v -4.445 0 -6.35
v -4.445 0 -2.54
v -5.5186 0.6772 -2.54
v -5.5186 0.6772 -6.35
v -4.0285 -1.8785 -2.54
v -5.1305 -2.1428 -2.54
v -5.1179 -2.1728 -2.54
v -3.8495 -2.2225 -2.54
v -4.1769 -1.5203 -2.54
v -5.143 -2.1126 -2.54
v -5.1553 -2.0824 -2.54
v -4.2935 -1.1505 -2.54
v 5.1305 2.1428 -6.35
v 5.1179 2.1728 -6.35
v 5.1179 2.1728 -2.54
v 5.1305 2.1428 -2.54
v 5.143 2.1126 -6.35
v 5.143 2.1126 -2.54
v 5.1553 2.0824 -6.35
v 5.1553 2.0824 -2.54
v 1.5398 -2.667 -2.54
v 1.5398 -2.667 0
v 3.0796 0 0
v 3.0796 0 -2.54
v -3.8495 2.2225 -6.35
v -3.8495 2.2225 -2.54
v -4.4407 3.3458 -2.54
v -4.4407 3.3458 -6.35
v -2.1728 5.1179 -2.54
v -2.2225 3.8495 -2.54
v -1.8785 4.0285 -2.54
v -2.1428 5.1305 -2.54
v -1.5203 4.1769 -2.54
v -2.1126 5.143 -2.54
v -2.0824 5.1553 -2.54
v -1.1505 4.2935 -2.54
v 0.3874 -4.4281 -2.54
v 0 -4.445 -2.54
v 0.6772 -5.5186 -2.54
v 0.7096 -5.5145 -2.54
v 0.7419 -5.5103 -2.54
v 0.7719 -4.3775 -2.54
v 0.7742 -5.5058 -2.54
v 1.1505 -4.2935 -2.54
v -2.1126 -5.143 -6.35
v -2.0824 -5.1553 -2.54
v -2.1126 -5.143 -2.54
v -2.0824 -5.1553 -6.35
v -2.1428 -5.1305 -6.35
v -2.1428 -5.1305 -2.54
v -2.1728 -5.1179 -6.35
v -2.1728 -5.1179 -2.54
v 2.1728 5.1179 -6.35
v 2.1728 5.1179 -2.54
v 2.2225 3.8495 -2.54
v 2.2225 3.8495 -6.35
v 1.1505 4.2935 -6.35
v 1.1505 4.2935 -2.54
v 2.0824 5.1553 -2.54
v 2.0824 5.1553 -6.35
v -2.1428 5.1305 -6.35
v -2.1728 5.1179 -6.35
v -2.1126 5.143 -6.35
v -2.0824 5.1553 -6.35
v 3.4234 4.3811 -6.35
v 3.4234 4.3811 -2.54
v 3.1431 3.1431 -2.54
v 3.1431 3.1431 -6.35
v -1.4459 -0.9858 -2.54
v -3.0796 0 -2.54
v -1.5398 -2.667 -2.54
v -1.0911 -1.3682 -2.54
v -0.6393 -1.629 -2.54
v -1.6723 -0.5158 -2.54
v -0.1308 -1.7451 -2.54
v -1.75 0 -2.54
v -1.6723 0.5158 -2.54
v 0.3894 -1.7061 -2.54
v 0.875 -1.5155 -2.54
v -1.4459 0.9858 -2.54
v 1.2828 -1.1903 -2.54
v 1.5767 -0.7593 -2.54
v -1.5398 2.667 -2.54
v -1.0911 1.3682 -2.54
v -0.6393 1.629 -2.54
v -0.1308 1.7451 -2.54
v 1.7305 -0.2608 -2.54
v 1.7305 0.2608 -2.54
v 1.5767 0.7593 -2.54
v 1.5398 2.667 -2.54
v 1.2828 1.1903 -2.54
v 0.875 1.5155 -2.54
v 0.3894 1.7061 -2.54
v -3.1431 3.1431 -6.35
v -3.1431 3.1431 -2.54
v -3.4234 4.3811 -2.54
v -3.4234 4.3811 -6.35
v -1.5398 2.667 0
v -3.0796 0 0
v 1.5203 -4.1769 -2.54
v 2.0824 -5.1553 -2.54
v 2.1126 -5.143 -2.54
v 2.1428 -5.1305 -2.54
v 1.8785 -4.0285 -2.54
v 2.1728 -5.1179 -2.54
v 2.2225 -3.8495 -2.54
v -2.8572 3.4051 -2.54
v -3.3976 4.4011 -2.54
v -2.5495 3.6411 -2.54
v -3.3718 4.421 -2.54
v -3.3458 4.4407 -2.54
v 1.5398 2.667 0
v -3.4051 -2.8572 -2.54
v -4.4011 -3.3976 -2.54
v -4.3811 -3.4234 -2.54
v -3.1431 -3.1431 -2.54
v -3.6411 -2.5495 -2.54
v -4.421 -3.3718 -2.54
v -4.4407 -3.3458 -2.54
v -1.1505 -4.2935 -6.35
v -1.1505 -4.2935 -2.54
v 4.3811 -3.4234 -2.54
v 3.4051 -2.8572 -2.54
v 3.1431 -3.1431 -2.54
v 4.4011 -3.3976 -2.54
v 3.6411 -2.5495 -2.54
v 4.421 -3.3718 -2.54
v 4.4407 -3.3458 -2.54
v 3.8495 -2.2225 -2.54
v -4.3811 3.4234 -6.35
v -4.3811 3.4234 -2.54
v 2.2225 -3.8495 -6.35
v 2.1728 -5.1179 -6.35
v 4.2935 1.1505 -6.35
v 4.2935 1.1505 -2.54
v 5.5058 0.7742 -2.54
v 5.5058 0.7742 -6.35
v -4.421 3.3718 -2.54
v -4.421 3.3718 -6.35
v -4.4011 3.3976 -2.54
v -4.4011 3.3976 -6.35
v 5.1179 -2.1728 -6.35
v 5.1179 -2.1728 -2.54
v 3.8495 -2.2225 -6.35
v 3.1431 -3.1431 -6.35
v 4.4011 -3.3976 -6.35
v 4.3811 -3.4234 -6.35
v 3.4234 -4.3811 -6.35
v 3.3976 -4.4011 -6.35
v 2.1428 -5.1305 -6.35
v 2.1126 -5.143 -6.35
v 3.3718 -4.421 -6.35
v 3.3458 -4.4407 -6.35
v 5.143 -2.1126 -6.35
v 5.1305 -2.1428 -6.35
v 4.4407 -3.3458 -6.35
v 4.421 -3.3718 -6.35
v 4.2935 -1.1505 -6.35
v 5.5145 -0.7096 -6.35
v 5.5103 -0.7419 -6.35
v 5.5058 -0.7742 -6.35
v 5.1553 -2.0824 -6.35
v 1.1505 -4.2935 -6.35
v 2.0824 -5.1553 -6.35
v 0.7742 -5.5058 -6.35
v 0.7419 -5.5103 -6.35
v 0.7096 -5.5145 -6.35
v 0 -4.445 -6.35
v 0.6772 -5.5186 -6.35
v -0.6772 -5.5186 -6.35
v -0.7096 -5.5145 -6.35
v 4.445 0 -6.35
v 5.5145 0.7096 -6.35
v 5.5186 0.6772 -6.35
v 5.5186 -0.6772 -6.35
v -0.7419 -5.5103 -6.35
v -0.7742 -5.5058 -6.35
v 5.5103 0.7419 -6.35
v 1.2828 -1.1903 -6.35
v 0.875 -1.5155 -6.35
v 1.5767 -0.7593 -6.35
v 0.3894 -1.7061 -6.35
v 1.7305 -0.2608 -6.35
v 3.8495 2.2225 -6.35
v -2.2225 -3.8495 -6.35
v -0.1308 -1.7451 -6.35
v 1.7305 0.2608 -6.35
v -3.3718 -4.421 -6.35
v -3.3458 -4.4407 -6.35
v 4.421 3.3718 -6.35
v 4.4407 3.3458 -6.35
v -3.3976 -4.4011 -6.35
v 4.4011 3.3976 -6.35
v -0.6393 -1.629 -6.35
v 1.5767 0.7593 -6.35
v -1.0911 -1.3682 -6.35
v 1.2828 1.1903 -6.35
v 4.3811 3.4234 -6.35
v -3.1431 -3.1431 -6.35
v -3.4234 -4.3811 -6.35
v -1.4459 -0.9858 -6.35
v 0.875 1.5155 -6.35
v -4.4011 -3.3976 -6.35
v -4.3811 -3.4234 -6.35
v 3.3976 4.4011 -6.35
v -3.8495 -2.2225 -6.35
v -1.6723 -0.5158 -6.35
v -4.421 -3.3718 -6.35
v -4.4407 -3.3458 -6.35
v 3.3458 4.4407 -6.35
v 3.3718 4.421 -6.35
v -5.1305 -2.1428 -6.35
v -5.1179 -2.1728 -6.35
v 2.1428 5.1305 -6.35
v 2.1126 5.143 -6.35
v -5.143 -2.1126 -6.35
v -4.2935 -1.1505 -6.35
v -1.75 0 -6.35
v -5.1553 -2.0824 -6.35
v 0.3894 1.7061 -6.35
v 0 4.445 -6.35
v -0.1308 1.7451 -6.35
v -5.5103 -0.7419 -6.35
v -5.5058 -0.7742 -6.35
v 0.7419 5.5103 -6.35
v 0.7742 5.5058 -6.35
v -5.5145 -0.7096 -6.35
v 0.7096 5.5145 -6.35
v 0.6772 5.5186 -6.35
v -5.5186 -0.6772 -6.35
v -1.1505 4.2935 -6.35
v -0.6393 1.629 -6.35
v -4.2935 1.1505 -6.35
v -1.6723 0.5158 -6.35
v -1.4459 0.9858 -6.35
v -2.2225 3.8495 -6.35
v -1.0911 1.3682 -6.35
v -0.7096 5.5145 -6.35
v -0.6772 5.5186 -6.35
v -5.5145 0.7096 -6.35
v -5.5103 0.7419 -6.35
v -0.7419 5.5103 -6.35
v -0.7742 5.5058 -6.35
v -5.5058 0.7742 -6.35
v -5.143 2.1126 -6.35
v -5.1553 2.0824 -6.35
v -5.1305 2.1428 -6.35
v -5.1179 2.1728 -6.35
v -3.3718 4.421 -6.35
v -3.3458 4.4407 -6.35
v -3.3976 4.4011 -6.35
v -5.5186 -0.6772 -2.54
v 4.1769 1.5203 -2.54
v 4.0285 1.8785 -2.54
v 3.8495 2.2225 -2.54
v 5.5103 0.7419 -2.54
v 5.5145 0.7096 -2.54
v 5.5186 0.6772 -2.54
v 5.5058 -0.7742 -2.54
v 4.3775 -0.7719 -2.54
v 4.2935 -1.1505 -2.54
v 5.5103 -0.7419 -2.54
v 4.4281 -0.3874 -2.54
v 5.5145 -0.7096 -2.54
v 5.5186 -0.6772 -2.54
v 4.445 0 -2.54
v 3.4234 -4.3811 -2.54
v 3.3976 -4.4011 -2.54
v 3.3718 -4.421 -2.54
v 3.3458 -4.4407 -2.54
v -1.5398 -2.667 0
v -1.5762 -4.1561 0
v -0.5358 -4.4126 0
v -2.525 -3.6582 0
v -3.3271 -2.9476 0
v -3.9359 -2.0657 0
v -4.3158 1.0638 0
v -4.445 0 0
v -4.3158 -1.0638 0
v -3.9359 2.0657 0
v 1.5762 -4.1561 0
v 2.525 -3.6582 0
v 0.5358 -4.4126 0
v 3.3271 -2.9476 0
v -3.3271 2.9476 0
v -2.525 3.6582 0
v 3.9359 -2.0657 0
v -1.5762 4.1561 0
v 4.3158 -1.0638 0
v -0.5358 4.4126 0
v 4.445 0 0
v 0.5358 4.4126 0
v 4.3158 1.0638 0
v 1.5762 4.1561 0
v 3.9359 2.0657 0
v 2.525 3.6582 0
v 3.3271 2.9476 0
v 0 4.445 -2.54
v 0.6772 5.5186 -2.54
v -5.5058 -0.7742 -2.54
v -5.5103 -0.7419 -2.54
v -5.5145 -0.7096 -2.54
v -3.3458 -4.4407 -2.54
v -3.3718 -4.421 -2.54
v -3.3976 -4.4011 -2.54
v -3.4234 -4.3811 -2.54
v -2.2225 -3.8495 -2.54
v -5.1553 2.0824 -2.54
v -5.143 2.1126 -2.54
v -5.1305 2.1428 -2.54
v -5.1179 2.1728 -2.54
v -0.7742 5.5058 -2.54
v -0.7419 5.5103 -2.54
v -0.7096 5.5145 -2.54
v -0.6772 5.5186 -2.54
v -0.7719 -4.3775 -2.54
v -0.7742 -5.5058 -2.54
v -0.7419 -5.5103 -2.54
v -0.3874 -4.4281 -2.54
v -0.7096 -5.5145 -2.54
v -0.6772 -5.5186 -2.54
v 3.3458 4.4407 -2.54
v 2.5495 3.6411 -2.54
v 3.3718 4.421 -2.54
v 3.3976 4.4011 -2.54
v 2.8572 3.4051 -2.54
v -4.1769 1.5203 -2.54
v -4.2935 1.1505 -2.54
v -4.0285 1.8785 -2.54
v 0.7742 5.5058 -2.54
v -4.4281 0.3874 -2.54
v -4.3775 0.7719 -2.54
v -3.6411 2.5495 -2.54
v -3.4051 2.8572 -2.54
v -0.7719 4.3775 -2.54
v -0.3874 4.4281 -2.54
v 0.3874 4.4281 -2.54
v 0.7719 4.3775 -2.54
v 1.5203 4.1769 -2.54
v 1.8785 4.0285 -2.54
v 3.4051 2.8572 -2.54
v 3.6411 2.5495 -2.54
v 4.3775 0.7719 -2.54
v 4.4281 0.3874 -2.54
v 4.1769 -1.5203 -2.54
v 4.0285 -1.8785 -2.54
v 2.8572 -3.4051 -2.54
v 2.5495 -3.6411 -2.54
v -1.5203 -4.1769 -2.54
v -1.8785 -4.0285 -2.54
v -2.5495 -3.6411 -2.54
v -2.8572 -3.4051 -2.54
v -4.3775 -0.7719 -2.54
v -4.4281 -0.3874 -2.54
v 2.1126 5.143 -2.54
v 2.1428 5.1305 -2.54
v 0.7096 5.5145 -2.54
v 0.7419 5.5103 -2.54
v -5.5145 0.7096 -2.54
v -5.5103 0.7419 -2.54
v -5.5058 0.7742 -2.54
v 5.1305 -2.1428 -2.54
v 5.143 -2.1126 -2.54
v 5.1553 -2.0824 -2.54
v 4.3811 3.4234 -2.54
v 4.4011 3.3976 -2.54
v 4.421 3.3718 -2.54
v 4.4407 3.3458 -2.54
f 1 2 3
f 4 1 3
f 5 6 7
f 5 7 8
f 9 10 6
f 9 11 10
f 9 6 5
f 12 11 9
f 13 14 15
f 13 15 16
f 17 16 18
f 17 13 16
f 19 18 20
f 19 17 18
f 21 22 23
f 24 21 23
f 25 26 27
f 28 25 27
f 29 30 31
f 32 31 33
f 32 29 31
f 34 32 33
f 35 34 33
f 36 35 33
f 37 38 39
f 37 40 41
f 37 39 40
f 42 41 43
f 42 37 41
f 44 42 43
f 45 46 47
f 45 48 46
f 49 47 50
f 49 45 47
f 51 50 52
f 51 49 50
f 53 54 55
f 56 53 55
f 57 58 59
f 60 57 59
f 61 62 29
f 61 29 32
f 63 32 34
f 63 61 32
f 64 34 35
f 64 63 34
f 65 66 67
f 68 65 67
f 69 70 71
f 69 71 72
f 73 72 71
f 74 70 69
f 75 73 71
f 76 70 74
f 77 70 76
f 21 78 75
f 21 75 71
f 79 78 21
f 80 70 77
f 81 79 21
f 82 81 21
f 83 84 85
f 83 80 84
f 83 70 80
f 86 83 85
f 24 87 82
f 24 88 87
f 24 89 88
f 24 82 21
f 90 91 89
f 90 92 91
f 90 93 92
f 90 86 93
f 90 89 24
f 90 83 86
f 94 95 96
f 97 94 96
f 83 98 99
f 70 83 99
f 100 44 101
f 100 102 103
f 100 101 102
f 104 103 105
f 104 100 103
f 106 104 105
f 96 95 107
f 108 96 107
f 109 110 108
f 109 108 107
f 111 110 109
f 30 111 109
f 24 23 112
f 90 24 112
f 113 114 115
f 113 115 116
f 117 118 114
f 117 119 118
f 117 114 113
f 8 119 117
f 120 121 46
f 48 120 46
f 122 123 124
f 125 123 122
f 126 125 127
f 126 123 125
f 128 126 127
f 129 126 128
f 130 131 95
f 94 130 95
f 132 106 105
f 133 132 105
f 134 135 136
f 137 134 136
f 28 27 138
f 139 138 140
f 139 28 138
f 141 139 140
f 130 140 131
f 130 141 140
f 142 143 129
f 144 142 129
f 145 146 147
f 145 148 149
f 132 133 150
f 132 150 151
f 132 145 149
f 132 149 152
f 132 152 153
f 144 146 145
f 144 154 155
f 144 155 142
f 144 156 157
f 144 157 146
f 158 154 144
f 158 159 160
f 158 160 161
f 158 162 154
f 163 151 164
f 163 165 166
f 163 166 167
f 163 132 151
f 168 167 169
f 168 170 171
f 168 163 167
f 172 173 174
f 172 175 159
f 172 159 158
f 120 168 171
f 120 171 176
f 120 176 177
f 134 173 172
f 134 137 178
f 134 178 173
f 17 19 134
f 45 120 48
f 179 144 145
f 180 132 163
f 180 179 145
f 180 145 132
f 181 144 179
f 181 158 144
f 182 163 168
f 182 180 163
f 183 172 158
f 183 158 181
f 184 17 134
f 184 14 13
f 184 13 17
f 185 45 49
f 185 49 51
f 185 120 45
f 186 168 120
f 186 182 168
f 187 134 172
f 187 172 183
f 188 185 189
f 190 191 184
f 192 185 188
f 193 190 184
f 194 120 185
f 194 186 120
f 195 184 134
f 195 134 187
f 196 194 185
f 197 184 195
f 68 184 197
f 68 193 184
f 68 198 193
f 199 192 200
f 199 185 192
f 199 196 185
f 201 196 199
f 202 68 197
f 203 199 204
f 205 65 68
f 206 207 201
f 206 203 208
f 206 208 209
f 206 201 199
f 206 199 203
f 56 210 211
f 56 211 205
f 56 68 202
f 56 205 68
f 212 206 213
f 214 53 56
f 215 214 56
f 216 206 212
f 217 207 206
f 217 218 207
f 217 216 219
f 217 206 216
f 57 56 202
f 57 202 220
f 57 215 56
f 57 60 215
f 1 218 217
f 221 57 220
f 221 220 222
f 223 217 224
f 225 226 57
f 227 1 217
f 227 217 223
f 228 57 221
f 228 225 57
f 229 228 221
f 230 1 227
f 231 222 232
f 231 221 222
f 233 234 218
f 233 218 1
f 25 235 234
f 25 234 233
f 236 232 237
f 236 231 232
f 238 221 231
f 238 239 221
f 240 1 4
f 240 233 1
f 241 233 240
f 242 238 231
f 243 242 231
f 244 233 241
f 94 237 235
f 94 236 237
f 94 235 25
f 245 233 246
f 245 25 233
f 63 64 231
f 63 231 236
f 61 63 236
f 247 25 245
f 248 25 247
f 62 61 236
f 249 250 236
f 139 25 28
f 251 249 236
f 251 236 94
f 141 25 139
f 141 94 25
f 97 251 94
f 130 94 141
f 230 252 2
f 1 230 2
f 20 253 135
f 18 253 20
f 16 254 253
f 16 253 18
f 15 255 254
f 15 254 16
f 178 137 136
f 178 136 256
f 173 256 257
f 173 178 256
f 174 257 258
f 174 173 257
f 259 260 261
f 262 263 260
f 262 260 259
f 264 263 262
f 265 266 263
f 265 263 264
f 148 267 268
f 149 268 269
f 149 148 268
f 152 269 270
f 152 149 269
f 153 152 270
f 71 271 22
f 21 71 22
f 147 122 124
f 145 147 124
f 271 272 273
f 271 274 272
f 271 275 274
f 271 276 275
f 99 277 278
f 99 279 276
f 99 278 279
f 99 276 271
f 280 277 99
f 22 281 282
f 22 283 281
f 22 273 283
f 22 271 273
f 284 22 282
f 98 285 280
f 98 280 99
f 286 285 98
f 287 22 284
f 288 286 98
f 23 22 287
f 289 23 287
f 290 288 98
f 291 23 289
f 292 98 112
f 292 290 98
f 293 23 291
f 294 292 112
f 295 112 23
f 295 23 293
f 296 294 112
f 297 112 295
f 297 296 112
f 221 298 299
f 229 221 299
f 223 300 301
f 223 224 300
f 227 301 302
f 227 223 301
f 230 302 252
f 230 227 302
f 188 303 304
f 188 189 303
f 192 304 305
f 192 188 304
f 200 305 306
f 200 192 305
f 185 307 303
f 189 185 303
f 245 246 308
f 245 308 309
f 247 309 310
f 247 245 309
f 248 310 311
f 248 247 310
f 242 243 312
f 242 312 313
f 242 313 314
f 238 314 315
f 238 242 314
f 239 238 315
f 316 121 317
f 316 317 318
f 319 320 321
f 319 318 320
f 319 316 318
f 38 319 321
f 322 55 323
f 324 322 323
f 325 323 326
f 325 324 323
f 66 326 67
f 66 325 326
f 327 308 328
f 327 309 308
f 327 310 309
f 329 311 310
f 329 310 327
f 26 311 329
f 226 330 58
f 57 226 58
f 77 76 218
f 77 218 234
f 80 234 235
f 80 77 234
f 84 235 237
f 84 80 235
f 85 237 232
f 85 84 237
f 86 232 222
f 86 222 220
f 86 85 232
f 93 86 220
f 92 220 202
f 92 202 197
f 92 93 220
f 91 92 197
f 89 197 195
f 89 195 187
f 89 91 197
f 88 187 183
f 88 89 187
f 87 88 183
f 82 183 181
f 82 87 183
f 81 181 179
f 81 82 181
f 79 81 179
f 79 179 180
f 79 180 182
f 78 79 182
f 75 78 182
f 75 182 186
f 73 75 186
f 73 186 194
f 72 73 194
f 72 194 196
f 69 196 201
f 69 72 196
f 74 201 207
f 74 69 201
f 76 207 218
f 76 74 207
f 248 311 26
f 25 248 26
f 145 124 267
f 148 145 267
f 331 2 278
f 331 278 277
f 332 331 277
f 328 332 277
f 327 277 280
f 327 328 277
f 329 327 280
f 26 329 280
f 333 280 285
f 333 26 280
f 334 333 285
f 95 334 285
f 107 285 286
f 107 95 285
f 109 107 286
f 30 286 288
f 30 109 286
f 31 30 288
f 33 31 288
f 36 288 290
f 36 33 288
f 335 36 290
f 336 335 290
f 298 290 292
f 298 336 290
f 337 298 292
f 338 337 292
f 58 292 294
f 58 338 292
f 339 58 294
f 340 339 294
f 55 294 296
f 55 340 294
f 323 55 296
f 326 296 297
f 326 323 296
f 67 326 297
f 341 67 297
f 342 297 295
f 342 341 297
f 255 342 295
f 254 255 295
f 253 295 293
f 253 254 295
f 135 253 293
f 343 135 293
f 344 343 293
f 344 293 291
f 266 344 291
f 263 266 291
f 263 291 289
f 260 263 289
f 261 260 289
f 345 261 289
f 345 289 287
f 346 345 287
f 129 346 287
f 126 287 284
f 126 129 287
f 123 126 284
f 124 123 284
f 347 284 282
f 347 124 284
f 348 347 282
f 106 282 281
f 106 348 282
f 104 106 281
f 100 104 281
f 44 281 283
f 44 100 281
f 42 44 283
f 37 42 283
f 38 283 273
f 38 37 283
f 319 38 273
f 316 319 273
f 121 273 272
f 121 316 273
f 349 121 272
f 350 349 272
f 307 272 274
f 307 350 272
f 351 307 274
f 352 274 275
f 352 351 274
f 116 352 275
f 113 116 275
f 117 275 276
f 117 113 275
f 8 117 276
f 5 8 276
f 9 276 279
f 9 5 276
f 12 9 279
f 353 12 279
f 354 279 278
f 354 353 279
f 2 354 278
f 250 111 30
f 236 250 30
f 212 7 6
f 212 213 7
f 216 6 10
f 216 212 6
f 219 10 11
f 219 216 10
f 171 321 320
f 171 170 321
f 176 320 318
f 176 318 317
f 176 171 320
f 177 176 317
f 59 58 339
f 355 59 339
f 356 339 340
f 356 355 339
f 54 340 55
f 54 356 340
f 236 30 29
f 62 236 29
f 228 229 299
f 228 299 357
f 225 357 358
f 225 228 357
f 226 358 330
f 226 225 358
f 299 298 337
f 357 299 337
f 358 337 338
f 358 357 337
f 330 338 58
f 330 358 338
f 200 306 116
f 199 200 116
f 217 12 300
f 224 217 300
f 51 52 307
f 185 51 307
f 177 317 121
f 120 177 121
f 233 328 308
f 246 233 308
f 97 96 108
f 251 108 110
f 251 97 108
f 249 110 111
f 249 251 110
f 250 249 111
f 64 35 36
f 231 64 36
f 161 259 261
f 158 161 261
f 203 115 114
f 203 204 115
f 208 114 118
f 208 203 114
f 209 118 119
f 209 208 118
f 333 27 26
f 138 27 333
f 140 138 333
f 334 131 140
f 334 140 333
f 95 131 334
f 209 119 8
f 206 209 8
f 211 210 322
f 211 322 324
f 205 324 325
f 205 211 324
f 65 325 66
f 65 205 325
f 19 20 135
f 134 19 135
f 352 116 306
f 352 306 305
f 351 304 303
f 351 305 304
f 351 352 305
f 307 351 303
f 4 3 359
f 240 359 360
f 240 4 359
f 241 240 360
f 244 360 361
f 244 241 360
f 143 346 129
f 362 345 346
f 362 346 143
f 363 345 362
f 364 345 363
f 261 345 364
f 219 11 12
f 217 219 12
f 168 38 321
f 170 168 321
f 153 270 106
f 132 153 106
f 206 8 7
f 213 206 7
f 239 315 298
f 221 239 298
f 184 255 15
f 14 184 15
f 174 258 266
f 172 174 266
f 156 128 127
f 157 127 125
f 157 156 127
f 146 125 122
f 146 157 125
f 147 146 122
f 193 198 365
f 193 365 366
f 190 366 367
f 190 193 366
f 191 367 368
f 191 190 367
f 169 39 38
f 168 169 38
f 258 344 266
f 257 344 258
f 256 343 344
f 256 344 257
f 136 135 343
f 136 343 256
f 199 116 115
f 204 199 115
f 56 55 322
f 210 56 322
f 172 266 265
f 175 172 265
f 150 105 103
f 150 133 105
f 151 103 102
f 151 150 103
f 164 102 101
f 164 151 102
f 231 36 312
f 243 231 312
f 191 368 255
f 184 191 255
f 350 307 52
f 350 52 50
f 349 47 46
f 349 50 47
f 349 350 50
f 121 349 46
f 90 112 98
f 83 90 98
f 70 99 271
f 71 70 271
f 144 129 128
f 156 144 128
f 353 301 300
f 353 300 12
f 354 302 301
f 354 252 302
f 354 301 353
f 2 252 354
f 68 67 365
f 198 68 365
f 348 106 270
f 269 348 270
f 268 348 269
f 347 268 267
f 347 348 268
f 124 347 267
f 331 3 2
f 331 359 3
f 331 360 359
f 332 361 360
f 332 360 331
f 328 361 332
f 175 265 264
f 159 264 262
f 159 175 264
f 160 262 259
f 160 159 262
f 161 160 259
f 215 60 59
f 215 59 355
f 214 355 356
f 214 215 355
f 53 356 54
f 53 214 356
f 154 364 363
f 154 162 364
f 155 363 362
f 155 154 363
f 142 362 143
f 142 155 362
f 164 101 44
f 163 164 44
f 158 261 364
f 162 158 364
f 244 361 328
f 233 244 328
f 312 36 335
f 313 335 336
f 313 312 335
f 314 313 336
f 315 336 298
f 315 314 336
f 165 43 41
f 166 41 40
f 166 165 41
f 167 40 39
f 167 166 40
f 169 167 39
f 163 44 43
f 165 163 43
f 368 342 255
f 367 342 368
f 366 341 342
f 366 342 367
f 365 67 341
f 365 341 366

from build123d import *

# Parameters (mm, degrees)
F3_DEPTH = 2.54
F4_R     = 6.6719294198
F5_DEPTH = 25.4


with BuildPart() as f1:
    # F0 (on Front) → F1 (revolve)
    with BuildSketch(Plane.XZ):
        Polygon((-5.56, -6.35), (-1.75, -6.35), (-1.75, 0), (-4.445, 0), (-4.445, -2.54), (-5.56, -2.54), align=None)
    revolve(axis=Axis((0, 0, -3.175), (0, 0, -1)))

    # F2 (on face) → F3 (cut)
    with BuildSketch(Plane.XY):
        Polygon((1.5397931679, 2.667), (-1.5397931679, 2.667), (-3.0795863359, 0), (-1.5397931679, -2.667), (1.5397931679, -2.667), (3.0795863359, 0), align=None)
    extrude(amount=-F3_DEPTH, mode=Mode.SUBTRACT)

    # F4 (on face) → F5 (cut)
    with BuildSketch(Plane.XY.offset(-2.54)):
        Circle(F4_R)
        with BuildLine():
            ThreePointArc((-0.7741932024, 5.5058355302), (-0.7257256287, 5.5124334292), (-0.6772018857, 5.5186046793))
            ThreePointArc((-0.6772018857, 5.5186046793), (0, 5.56), (0.6772018857, 5.5186046793))
            ThreePointArc((0.6772018857, 5.5186046793), (0.7257256287, 5.5124334292), (0.7741932024, 5.5058355302))
            ThreePointArc((0.7741932024, 5.5058355302), (1.4390338908, 5.3705475942), (2.0824467844, 5.1552900394))
            ThreePointArc((2.0824467844, 5.1552900394), (2.1277198839, 5.1367702008), (2.1728283032, 5.1178527885))
            ThreePointArc((2.1728283032, 5.1178527885), (2.78, 4.815101245), (3.3457763761, 4.4406509029))
            ThreePointArc((3.3457763761, 4.4406509029), (3.3847135453, 4.411044572), (3.4233887458, 4.381096837))
            ThreePointArc((3.4233887458, 4.381096837), (3.9315137034, 3.9315137034), (4.381096837, 3.4233887458))
            ThreePointArc((4.381096837, 3.4233887458), (4.411044572, 3.3847135453), (4.4406509029, 3.3457763761))
            ThreePointArc((4.4406509029, 3.3457763761), (4.815101245, 2.78), (5.1178527885, 2.1728283032))
            ThreePointArc((5.1178527885, 2.1728283032), (5.1367702008, 2.1277198839), (5.1552900394, 2.0824467844))
            ThreePointArc((5.1552900394, 2.0824467844), (5.3705475942, 1.4390338908), (5.5058355302, 0.7741932024))
            ThreePointArc((5.5058355302, 0.7741932024), (5.5124334292, 0.7257256287), (5.5186046793, 0.6772018857))
            ThreePointArc((5.5186046793, 0.6772018857), (5.5496415207, 0.339232946), (5.56, 0))
            ThreePointArc((5.56, 0), (5.5496415207, -0.339232946), (5.5186046793, -0.6772018857))
            ThreePointArc((5.5186046793, -0.6772018857), (5.5124334292, -0.7257256287), (5.5058355302, -0.7741932024))
            ThreePointArc((5.5058355302, -0.7741932024), (5.3705475942, -1.4390338908), (5.1552900394, -2.0824467844))
            ThreePointArc((5.1552900394, -2.0824467844), (5.1367702008, -2.1277198839), (5.1178527885, -2.1728283032))
            ThreePointArc((5.1178527885, -2.1728283032), (4.815101245, -2.78), (4.4406509029, -3.3457763761))
            ThreePointArc((4.4406509029, -3.3457763761), (4.411044572, -3.3847135453), (4.381096837, -3.4233887458))
            ThreePointArc((4.381096837, -3.4233887458), (3.9315137034, -3.9315137034), (3.4233887458, -4.381096837))
            ThreePointArc((3.4233887458, -4.381096837), (3.3847135453, -4.411044572), (3.3457763761, -4.4406509029))
            ThreePointArc((3.3457763761, -4.4406509029), (2.78, -4.815101245), (2.1728283032, -5.1178527885))
            ThreePointArc((2.1728283032, -5.1178527885), (2.1277198839, -5.1367702008), (2.0824467844, -5.1552900394))
            ThreePointArc((2.0824467844, -5.1552900394), (1.4390338908, -5.3705475942), (0.7741932024, -5.5058355302))
            ThreePointArc((0.7741932024, -5.5058355302), (0.7257256287, -5.5124334292), (0.6772018857, -5.5186046793))
            ThreePointArc((0.6772018857, -5.5186046793), (0, -5.56), (-0.6772018857, -5.5186046793))
            ThreePointArc((-0.6772018857, -5.5186046793), (-0.7257256287, -5.5124334292), (-0.7741932024, -5.5058355302))
            ThreePointArc((-0.7741932024, -5.5058355302), (-1.4390338908, -5.3705475942), (-2.0824467844, -5.1552900394))
            ThreePointArc((-2.0824467844, -5.1552900394), (-2.1277198839, -5.1367702008), (-2.1728283032, -5.1178527885))
            ThreePointArc((-2.1728283032, -5.1178527885), (-2.78, -4.815101245), (-3.3457763761, -4.4406509029))
            ThreePointArc((-3.3457763761, -4.4406509029), (-3.3847135453, -4.411044572), (-3.4233887458, -4.381096837))
            ThreePointArc((-3.4233887458, -4.381096837), (-3.9315137034, -3.9315137034), (-4.381096837, -3.4233887458))
            ThreePointArc((-4.381096837, -3.4233887458), (-4.411044572, -3.3847135453), (-4.4406509029, -3.3457763761))
            ThreePointArc((-4.4406509029, -3.3457763761), (-4.815101245, -2.78), (-5.1178527885, -2.1728283032))
            ThreePointArc((-5.1178527885, -2.1728283032), (-5.1367702008, -2.1277198839), (-5.1552900394, -2.0824467844))
            ThreePointArc((-5.1552900394, -2.0824467844), (-5.3705475942, -1.4390338908), (-5.5058355302, -0.7741932024))
            ThreePointArc((-5.5058355302, -0.7741932024), (-5.5124334292, -0.7257256287), (-5.5186046793, -0.6772018857))
            ThreePointArc((-5.5186046793, -0.6772018857), (-5.56, 0), (-5.5186046793, 0.6772018857))
            ThreePointArc((-5.5186046793, 0.6772018857), (-5.5124334292, 0.7257256287), (-5.5058355302, 0.7741932024))
            ThreePointArc((-5.5058355302, 0.7741932024), (-5.3705475942, 1.4390338908), (-5.1552900394, 2.0824467844))
            ThreePointArc((-5.1552900394, 2.0824467844), (-5.1367702008, 2.1277198839), (-5.1178527885, 2.1728283032))
            ThreePointArc((-5.1178527885, 2.1728283032), (-4.815101245, 2.78), (-4.4406509029, 3.3457763761))
            ThreePointArc((-4.4406509029, 3.3457763761), (-4.411044572, 3.3847135453), (-4.381096837, 3.4233887458))
            ThreePointArc((-4.381096837, 3.4233887458), (-3.9315137034, 3.9315137034), (-3.4233887458, 4.381096837))
            ThreePointArc((-3.4233887458, 4.381096837), (-3.3847135453, 4.411044572), (-3.3457763761, 4.4406509029))
            ThreePointArc((-3.3457763761, 4.4406509029), (-2.78, 4.815101245), (-2.1728283032, 5.1178527885))
            ThreePointArc((-2.1728283032, 5.1178527885), (-2.1277198839, 5.1367702008), (-2.0824467844, 5.1552900394))
            ThreePointArc((-2.0824467844, 5.1552900394), (-1.4390338908, 5.3705475942), (-0.7741932024, 5.5058355302))
        make_face(mode=Mode.SUBTRACT)
        with BuildLine():
            Line((-5.1178527885, 2.1728283032), (-3.8494829198, 2.2225))
            Line((-3.8494829198, 2.2225), (-4.4406509029, 3.3457763761))
            ThreePointArc((-4.4406509029, 3.3457763761), (-4.815101245, 2.78), (-5.1178527885, 2.1728283032))
        make_face()
        with BuildLine():
            Line((-4.381096837, 3.4233887458), (-3.1430896424, 3.1430896424))
            Line((-3.1430896424, 3.1430896424), (-3.4233887458, 4.381096837))
            ThreePointArc((-3.4233887458, 4.381096837), (-3.9315137034, 3.9315137034), (-4.381096837, 3.4233887458))
        make_face()
        with BuildLine():
            Line((-3.3457763761, 4.4406509029), (-2.2225, 3.8494829198))
            Line((-2.2225, 3.8494829198), (-2.1728283032, 5.1178527885))
            ThreePointArc((-2.1728283032, 5.1178527885), (-2.78, 4.815101245), (-3.3457763761, 4.4406509029))
        make_face()
        with BuildLine():
            Line((-2.0824467844, 5.1552900394), (-1.1504506555, 4.2935402979))
            Line((-1.1504506555, 4.2935402979), (-0.7741932024, 5.5058355302))
            ThreePointArc((-0.7741932024, 5.5058355302), (-1.4390338908, 5.3705475942), (-2.0824467844, 5.1552900394))
        make_face()
        with BuildLine():
            Line((-5.5058355302, 0.7741932024), (-4.2935402979, 1.1504506555))
            Line((-4.2935402979, 1.1504506555), (-5.1552900394, 2.0824467844))
            ThreePointArc((-5.1552900394, 2.0824467844), (-5.3705475942, 1.4390338908), (-5.5058355302, 0.7741932024))
        make_face()
        with BuildLine():
            Line((-5.5186046793, -0.6772018857), (-4.445, 0))
            Line((-4.445, 0), (-5.5186046793, 0.6772018857))
            ThreePointArc((-5.5186046793, 0.6772018857), (-5.56, 0), (-5.5186046793, -0.6772018857))
        make_face()
        with BuildLine():
            Line((-5.1552900394, -2.0824467844), (-4.2935402979, -1.1504506555))
            Line((-4.2935402979, -1.1504506555), (-5.5058355302, -0.7741932024))
            ThreePointArc((-5.5058355302, -0.7741932024), (-5.3705475942, -1.4390338908), (-5.1552900394, -2.0824467844))
        make_face()
        with BuildLine():
            Line((-4.4406509029, -3.3457763761), (-3.8494829198, -2.2225))
            Line((-3.8494829198, -2.2225), (-5.1178527885, -2.1728283032))
            ThreePointArc((-5.1178527885, -2.1728283032), (-4.815101245, -2.78), (-4.4406509029, -3.3457763761))
        make_face()
        with BuildLine():
            Line((-3.4233887458, -4.381096837), (-3.1430896424, -3.1430896424))
            Line((-3.1430896424, -3.1430896424), (-4.381096837, -3.4233887458))
            ThreePointArc((-4.381096837, -3.4233887458), (-3.9315137034, -3.9315137034), (-3.4233887458, -4.381096837))
        make_face()
        with BuildLine():
            Line((-2.1728283032, -5.1178527885), (-2.2225, -3.8494829198))
            Line((-2.2225, -3.8494829198), (-3.3457763761, -4.4406509029))
            ThreePointArc((-3.3457763761, -4.4406509029), (-2.78, -4.815101245), (-2.1728283032, -5.1178527885))
        make_face()
        with BuildLine():
            Line((-0.7741932024, -5.5058355302), (-1.1504506555, -4.2935402979))
            Line((-1.1504506555, -4.2935402979), (-2.0824467844, -5.1552900394))
            ThreePointArc((-2.0824467844, -5.1552900394), (-1.4390338908, -5.3705475942), (-0.7741932024, -5.5058355302))
        make_face()
        with BuildLine():
            Line((0.6772018857, -5.5186046793), (0, -4.445))
            Line((0, -4.445), (-0.6772018857, -5.5186046793))
            ThreePointArc((-0.6772018857, -5.5186046793), (0, -5.56), (0.6772018857, -5.5186046793))
        make_face()
        with BuildLine():
            Line((2.0824467844, -5.1552900394), (1.1504506555, -4.2935402979))
            Line((1.1504506555, -4.2935402979), (0.7741932024, -5.5058355302))
            ThreePointArc((0.7741932024, -5.5058355302), (1.4390338908, -5.3705475942), (2.0824467844, -5.1552900394))
        make_face()
        with BuildLine():
            Line((3.3457763761, -4.4406509029), (2.2225, -3.8494829198))
            Line((2.2225, -3.8494829198), (2.1728283032, -5.1178527885))
            ThreePointArc((2.1728283032, -5.1178527885), (2.78, -4.815101245), (3.3457763761, -4.4406509029))
        make_face()
        with BuildLine():
            Line((4.381096837, -3.4233887458), (3.1430896424, -3.1430896424))
            Line((3.1430896424, -3.1430896424), (3.4233887458, -4.381096837))
            ThreePointArc((3.4233887458, -4.381096837), (3.9315137034, -3.9315137034), (4.381096837, -3.4233887458))
        make_face()
        with BuildLine():
            Line((5.1178527885, -2.1728283032), (3.8494829198, -2.2225))
            Line((3.8494829198, -2.2225), (4.4406509029, -3.3457763761))
            ThreePointArc((4.4406509029, -3.3457763761), (4.815101245, -2.78), (5.1178527885, -2.1728283032))
        make_face()
        with BuildLine():
            Line((5.5058355302, -0.7741932024), (4.2935402979, -1.1504506555))
            Line((4.2935402979, -1.1504506555), (5.1552900394, -2.0824467844))
            ThreePointArc((5.1552900394, -2.0824467844), (5.3705475942, -1.4390338908), (5.5058355302, -0.7741932024))
        make_face()
        with BuildLine():
            Line((5.5186046793, 0.6772018857), (4.445, 0))
            Line((4.445, 0), (5.5186046793, -0.6772018857))
            ThreePointArc((5.5186046793, -0.6772018857), (5.5496415207, -0.339232946), (5.56, 0))
            ThreePointArc((5.56, 0), (5.5496415207, 0.339232946), (5.5186046793, 0.6772018857))
        make_face()
        with BuildLine():
            Line((5.1552900394, 2.0824467844), (4.2935402979, 1.1504506555))
            Line((4.2935402979, 1.1504506555), (5.5058355302, 0.7741932024))
            ThreePointArc((5.5058355302, 0.7741932024), (5.3705475942, 1.4390338908), (5.1552900394, 2.0824467844))
        make_face()
        with BuildLine():
            Line((4.4406509029, 3.3457763761), (3.8494829198, 2.2225))
            Line((3.8494829198, 2.2225), (5.1178527885, 2.1728283032))
            ThreePointArc((5.1178527885, 2.1728283032), (4.815101245, 2.78), (4.4406509029, 3.3457763761))
        make_face()
        with BuildLine():
            Line((3.4233887458, 4.381096837), (3.1430896424, 3.1430896424))
            Line((3.1430896424, 3.1430896424), (4.381096837, 3.4233887458))
            ThreePointArc((4.381096837, 3.4233887458), (3.9315137034, 3.9315137034), (3.4233887458, 4.381096837))
        make_face()
        with BuildLine():
            Line((2.1728283032, 5.1178527885), (2.2225, 3.8494829198))
            Line((2.2225, 3.8494829198), (3.3457763761, 4.4406509029))
            ThreePointArc((3.3457763761, 4.4406509029), (2.78, 4.815101245), (2.1728283032, 5.1178527885))
        make_face()
        with BuildLine():
            Line((0.7741932024, 5.5058355302), (1.1504506555, 4.2935402979))
            Line((1.1504506555, 4.2935402979), (2.0824467844, 5.1552900394))
            ThreePointArc((2.0824467844, 5.1552900394), (1.4390338908, 5.3705475942), (0.7741932024, 5.5058355302))
        make_face()
        with BuildLine():
            Line((-0.6772018857, 5.5186046793), (0, 4.445))
            Line((0, 4.445), (0.6772018857, 5.5186046793))
            ThreePointArc((0.6772018857, 5.5186046793), (0, 5.56), (-0.6772018857, 5.5186046793))
        make_face()
    extrude(amount=-F5_DEPTH, mode=Mode.SUBTRACT)


solid = f1.part
